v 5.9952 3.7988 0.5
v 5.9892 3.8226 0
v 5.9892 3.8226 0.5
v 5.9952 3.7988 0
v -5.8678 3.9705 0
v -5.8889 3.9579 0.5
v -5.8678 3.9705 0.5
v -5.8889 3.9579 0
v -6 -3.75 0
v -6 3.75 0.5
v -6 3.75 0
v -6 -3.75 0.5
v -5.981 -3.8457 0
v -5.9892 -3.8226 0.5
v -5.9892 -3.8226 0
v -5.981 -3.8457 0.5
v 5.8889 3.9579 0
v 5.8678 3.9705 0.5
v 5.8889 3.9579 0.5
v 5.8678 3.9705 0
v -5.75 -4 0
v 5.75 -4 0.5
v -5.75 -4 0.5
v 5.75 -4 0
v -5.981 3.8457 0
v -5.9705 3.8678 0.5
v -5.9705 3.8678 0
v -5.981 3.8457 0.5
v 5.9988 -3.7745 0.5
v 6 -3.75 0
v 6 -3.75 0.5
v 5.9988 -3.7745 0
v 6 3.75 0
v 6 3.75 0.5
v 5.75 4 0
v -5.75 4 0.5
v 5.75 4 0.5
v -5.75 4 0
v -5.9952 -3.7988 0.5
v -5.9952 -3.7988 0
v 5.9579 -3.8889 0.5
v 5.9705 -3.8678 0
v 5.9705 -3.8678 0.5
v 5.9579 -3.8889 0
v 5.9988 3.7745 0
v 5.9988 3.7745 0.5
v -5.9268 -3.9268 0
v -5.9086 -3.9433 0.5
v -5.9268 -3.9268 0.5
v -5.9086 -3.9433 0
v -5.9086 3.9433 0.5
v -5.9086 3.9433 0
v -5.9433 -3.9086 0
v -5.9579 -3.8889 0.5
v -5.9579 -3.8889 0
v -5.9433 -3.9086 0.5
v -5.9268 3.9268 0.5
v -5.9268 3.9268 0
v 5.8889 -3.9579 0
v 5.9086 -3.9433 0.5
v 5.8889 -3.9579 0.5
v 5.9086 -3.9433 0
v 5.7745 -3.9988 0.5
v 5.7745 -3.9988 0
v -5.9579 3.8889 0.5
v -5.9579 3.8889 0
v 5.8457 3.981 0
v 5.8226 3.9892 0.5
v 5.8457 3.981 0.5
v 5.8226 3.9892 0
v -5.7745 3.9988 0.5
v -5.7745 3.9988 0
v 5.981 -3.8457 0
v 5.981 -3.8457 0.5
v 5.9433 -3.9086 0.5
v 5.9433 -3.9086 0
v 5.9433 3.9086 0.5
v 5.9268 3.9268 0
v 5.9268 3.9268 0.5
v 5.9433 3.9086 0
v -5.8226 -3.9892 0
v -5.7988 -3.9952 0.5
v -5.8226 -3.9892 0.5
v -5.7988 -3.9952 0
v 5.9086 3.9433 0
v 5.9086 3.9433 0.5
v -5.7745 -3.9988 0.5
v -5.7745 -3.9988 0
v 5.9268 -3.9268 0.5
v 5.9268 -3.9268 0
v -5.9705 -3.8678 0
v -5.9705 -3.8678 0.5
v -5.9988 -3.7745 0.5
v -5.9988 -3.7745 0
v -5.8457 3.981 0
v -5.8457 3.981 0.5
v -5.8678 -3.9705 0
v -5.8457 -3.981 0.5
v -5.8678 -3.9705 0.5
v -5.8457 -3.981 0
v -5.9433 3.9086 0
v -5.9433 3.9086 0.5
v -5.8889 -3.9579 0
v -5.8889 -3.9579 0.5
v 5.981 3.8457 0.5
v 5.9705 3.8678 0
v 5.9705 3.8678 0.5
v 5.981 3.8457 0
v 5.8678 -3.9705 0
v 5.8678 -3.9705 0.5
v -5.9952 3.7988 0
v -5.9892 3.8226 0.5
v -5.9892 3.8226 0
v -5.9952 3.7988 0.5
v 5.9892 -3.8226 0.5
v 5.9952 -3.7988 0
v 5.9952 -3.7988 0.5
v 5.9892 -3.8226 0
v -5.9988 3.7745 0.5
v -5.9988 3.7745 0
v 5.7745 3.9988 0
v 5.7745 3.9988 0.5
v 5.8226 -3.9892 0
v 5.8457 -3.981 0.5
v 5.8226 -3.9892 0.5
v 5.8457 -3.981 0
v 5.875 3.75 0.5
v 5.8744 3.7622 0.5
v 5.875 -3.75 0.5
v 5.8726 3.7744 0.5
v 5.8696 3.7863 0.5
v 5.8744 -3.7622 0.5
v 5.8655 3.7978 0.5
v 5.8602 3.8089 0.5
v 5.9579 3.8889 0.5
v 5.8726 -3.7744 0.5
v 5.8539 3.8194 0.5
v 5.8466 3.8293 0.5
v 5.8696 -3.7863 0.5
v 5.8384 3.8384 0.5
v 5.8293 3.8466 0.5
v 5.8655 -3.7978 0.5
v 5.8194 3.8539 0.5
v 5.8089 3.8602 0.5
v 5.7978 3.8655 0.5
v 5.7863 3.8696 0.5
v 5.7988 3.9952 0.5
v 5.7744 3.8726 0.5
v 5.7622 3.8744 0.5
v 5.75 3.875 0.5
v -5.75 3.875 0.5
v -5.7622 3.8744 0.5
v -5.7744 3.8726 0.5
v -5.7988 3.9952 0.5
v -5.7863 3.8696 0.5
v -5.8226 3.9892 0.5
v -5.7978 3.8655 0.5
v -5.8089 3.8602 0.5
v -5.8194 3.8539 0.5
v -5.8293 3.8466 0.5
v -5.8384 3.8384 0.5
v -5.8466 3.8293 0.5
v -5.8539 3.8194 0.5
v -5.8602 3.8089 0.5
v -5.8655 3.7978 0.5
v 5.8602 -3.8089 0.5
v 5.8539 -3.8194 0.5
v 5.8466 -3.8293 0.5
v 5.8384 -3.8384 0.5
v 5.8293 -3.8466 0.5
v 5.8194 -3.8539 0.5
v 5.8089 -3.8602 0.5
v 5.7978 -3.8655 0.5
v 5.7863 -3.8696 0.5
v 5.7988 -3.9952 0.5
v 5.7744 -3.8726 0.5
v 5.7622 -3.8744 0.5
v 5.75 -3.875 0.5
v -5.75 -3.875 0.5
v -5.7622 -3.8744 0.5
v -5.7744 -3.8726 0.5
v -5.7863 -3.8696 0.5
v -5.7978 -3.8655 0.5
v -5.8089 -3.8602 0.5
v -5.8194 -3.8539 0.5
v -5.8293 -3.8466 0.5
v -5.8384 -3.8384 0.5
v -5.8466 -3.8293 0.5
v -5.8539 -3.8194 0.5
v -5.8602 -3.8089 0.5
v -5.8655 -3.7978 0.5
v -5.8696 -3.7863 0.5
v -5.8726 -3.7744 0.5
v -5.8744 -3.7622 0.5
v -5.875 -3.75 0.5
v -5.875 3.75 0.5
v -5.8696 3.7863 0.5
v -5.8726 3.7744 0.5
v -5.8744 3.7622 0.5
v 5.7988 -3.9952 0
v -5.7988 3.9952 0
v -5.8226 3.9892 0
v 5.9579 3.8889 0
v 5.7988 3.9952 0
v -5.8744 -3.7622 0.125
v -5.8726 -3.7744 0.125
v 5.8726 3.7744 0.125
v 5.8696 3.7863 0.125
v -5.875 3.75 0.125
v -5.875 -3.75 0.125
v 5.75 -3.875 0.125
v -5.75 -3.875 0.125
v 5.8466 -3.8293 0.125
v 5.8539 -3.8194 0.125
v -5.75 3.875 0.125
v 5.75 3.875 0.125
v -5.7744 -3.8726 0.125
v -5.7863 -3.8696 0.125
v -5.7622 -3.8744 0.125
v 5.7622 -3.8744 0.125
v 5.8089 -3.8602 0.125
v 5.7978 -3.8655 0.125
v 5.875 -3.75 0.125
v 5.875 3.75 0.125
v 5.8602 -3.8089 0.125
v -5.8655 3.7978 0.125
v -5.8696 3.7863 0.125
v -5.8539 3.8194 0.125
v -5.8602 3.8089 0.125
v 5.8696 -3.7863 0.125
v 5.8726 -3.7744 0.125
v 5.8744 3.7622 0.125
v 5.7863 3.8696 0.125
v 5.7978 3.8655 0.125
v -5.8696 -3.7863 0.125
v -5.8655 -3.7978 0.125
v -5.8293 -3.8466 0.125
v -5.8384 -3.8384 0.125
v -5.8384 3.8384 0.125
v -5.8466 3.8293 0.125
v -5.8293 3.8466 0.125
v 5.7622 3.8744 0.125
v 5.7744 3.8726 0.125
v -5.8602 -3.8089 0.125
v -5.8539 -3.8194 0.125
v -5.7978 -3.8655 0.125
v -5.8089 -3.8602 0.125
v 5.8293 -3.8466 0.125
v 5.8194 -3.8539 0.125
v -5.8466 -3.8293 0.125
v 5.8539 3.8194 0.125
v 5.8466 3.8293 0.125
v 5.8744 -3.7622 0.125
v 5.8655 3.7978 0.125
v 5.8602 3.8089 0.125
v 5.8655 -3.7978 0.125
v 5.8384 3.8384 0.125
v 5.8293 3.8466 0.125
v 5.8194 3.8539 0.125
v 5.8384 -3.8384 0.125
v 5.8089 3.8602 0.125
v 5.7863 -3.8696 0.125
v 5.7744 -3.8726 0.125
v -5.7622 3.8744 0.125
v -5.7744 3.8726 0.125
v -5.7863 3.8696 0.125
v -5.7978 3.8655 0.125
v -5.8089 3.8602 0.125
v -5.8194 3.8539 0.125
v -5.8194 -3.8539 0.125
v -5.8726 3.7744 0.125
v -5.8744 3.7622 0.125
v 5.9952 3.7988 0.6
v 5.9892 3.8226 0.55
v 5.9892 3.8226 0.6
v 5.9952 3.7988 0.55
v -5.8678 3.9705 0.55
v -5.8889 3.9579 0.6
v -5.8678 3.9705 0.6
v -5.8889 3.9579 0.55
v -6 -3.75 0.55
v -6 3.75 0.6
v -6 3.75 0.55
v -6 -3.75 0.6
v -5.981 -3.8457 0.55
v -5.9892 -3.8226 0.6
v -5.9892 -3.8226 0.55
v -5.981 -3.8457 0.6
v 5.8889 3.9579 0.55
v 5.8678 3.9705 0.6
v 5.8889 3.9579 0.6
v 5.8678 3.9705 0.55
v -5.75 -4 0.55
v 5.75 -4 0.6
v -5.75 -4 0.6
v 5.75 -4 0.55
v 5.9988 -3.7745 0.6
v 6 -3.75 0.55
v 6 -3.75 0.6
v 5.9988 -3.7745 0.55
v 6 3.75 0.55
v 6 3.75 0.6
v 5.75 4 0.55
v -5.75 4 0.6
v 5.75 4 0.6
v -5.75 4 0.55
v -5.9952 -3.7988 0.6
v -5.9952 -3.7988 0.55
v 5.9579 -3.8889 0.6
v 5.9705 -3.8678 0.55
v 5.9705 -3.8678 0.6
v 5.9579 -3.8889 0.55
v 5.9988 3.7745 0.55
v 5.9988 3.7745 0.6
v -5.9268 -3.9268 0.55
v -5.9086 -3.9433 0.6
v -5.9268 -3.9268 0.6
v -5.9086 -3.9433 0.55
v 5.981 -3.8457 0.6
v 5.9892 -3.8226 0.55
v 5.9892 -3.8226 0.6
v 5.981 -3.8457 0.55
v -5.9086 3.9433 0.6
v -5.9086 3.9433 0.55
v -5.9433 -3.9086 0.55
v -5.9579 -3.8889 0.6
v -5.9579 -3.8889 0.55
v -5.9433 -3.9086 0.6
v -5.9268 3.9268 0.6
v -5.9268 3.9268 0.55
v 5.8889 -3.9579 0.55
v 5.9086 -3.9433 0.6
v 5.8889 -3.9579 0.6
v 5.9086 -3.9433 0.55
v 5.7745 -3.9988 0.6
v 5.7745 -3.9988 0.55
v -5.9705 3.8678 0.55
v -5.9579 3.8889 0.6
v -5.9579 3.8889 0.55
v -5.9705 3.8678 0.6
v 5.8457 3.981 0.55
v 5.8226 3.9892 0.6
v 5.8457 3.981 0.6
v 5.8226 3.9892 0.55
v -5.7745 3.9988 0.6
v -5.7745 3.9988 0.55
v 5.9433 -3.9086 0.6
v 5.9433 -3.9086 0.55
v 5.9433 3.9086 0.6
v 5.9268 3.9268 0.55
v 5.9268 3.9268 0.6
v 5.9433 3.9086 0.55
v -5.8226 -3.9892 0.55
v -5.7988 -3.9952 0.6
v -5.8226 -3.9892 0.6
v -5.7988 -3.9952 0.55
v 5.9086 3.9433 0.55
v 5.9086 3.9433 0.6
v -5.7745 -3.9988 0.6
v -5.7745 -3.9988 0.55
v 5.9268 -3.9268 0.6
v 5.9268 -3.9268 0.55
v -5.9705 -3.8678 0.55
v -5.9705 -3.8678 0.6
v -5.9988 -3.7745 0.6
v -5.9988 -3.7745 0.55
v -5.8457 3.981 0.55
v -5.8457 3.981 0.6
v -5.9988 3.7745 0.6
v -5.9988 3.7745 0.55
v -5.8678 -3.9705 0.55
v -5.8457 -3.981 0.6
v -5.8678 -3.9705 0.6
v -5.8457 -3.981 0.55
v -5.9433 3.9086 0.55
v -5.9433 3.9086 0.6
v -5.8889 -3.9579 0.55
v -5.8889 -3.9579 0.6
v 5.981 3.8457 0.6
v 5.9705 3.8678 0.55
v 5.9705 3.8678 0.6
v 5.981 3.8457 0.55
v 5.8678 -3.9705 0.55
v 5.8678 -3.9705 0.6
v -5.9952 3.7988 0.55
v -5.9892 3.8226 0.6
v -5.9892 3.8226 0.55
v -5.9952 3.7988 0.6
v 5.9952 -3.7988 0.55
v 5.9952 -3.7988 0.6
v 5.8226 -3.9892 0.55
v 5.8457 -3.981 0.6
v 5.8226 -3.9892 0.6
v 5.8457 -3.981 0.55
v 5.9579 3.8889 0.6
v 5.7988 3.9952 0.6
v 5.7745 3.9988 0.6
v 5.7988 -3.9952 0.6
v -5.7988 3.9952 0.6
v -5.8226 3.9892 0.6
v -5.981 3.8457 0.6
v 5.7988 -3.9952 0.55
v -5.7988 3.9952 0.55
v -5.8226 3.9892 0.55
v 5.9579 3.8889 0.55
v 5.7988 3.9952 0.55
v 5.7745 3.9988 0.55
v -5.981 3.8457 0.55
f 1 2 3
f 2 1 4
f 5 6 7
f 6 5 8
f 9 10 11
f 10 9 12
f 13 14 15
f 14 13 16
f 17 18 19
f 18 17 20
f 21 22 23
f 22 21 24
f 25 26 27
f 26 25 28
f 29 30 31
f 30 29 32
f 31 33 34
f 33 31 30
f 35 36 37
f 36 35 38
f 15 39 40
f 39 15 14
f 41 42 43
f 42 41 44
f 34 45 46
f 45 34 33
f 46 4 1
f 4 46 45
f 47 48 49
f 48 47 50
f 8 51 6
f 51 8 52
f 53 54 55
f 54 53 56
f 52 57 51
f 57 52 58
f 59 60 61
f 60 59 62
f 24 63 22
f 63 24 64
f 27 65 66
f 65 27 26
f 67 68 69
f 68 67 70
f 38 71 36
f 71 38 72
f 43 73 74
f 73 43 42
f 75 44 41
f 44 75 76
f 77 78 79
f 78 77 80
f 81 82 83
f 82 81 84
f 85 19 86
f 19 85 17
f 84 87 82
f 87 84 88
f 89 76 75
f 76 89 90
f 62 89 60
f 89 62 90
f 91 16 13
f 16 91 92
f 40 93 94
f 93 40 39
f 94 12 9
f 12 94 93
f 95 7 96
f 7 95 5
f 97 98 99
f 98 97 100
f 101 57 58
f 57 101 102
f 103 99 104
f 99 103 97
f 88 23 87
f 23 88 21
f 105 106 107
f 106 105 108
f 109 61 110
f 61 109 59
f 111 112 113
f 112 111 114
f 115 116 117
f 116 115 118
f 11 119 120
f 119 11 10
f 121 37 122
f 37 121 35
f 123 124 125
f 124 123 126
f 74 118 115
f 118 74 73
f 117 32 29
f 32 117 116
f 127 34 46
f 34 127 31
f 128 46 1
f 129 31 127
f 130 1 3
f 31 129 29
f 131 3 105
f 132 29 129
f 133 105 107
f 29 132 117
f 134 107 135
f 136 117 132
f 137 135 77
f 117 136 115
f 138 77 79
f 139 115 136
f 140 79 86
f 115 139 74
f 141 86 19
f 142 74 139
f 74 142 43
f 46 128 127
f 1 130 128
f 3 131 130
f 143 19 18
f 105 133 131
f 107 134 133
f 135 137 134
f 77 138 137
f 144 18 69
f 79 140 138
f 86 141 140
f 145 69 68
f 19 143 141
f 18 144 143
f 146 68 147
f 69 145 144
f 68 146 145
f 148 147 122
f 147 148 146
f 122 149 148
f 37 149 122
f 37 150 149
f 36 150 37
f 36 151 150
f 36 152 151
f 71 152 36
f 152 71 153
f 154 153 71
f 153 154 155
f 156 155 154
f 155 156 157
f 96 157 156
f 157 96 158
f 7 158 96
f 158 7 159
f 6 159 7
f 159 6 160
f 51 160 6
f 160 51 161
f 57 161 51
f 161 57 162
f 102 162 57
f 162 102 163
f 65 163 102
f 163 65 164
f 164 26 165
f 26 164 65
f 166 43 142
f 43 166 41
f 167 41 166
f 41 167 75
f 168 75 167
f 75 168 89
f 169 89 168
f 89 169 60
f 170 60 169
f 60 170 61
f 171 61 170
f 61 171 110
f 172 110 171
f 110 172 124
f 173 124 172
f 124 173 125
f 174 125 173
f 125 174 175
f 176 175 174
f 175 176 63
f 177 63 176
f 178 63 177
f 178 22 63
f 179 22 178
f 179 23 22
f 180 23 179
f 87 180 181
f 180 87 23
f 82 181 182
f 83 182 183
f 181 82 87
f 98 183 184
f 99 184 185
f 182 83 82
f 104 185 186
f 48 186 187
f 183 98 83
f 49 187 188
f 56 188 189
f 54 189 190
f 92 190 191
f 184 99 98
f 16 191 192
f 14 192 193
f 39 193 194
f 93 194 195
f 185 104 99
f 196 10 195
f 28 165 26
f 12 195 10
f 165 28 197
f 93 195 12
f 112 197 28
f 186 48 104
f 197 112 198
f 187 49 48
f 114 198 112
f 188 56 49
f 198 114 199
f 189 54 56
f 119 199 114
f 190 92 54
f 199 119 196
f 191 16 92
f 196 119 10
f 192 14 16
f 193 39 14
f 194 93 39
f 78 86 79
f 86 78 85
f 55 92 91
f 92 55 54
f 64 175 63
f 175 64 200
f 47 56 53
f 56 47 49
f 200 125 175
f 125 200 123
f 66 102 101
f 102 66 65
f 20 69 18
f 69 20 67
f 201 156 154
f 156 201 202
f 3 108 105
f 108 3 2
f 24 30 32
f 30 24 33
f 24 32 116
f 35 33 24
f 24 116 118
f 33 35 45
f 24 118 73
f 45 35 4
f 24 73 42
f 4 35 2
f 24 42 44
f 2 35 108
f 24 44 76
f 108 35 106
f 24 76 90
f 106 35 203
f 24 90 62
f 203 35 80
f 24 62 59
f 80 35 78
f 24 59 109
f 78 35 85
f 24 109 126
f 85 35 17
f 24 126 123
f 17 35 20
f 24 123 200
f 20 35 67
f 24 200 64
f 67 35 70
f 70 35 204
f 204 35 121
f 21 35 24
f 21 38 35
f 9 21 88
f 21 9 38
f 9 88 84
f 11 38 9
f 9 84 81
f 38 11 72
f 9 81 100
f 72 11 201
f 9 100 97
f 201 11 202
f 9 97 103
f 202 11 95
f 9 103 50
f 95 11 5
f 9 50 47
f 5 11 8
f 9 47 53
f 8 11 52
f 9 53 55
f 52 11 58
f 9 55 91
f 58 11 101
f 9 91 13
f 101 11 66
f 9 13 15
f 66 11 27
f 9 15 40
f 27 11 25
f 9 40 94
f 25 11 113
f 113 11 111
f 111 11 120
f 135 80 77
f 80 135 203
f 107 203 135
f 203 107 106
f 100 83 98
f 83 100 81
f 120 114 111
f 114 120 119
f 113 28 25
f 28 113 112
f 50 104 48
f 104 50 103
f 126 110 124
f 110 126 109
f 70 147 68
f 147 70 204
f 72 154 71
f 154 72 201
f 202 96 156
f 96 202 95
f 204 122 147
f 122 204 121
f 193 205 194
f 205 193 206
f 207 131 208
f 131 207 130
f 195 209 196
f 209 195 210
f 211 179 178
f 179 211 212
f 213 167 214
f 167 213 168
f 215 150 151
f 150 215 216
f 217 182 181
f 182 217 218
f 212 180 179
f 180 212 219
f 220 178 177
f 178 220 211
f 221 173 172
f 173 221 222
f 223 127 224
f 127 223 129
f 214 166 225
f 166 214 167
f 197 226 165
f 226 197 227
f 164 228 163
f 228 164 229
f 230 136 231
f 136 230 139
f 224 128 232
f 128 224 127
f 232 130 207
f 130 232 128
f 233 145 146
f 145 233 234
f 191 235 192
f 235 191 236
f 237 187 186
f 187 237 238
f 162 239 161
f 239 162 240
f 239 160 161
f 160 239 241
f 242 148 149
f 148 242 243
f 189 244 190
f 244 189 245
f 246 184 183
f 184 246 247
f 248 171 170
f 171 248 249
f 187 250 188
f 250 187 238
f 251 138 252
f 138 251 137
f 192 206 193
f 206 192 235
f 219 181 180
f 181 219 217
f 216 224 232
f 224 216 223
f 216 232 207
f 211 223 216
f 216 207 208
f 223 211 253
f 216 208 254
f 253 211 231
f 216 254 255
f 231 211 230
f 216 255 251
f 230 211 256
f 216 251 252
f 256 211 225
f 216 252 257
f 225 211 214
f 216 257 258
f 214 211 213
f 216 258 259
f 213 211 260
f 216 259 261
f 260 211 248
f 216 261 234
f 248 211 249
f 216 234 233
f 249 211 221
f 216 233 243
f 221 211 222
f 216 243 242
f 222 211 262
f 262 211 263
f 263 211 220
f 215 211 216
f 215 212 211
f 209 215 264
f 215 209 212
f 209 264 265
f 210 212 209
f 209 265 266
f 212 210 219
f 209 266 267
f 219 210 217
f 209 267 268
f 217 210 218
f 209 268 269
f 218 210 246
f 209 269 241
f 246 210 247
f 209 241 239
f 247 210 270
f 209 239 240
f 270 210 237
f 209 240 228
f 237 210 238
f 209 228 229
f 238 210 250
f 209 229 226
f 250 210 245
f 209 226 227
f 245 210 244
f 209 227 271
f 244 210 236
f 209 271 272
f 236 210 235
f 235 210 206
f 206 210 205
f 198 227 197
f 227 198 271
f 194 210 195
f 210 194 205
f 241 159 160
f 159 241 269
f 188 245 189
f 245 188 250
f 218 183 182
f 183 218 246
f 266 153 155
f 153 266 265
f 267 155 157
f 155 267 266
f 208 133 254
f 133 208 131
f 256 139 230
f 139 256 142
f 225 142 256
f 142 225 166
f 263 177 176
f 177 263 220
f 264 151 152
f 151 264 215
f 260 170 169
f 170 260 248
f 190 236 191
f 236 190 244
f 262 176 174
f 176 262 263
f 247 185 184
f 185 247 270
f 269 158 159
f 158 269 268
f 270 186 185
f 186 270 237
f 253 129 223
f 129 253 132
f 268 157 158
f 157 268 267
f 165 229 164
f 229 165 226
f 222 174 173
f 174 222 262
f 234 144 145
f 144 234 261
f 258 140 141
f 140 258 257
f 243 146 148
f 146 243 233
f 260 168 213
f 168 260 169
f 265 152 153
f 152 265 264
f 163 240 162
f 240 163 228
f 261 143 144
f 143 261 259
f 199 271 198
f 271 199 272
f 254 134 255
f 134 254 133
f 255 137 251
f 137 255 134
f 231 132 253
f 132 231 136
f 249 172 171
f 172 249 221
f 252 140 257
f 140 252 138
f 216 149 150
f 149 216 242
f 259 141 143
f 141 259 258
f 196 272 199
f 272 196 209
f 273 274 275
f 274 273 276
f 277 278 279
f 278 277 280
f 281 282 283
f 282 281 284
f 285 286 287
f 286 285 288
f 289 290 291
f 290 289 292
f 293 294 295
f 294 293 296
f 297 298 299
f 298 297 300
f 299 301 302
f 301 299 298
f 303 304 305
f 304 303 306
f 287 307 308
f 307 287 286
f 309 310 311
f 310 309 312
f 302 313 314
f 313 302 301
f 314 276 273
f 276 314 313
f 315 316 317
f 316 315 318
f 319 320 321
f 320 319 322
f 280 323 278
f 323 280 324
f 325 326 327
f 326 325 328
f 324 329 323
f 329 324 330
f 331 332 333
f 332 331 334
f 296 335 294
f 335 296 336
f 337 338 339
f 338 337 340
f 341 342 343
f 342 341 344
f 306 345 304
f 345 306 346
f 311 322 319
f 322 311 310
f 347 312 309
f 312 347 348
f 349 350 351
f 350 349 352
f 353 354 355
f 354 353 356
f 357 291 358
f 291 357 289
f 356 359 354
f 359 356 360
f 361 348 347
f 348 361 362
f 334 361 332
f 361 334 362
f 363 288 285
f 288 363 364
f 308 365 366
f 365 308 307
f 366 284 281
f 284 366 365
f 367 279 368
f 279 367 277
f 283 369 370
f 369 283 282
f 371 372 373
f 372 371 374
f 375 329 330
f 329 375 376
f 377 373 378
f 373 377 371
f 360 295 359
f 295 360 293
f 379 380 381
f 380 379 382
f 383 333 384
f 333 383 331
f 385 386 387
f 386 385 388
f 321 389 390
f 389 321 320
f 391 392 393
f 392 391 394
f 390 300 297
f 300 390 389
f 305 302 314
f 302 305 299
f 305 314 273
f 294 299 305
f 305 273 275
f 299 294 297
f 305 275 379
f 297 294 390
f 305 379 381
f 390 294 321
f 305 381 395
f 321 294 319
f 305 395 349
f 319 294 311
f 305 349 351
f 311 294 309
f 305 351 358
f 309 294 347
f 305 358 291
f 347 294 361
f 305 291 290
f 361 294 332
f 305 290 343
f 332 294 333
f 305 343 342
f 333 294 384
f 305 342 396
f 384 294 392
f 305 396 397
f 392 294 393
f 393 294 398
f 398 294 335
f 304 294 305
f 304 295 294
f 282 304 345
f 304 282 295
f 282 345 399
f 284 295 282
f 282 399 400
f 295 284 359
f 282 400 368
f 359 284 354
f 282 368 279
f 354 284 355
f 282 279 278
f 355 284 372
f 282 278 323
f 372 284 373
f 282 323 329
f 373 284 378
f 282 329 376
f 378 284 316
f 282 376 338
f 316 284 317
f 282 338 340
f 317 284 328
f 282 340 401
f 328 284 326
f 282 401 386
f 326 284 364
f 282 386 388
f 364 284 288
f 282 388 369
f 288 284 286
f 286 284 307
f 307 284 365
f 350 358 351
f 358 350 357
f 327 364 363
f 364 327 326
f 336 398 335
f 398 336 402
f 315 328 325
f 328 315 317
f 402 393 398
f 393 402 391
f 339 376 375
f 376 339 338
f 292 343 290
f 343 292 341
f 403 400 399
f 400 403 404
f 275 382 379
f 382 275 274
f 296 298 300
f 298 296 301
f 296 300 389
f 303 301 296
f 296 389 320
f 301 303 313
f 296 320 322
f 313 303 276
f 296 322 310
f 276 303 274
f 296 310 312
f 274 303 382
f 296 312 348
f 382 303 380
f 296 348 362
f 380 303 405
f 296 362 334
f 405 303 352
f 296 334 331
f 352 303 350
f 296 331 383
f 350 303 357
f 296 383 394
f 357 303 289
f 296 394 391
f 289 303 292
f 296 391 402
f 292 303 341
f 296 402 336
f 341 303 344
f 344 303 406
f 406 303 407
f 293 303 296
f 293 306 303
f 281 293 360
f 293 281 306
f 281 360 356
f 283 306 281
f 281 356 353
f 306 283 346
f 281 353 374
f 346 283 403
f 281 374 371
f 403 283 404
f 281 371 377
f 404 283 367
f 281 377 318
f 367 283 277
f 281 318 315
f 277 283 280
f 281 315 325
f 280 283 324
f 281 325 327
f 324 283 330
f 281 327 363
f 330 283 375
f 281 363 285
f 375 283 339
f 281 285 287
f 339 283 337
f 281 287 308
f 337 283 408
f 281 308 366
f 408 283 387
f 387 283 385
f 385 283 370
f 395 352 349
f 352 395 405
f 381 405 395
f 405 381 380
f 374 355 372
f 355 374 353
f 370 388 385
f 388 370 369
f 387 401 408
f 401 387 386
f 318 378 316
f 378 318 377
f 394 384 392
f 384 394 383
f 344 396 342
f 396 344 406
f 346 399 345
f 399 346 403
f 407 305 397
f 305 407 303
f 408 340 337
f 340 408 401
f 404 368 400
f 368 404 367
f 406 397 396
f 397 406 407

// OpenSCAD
// Parametric box for CNC (units: inches)
// Usage: change width, height, depth, wall_thickness and render/export as STL or 2D projection.

width = 12; // inches
height = 8; // inches
depth = 0.5; // thickness in inches
wall_thickness = 0.125; // 1/8"
corner_radius = 0.25; // inches
show_lid = true;
lid_overlap = 0.05; // overlap in inches

module rounded_rect(w, h, r) {
  if (r <= 0) {
    square([w, h], center=true);
  } else {
    minkowski() {
      square([w-2*r, h-2*r], center=true);
      circle(r=r, $fn=64);
    }
  }
}

difference() {
  // outer box
  translate([0,0,0]) linear_extrude(depth)
    rounded_rect(width, height, corner_radius);
  // inner cutout
  translate([0,0,wall_thickness]) linear_extrude(depth - wall_thickness)
    rounded_rect(width - 2*wall_thickness, height - 2*wall_thickness, max(0, corner_radius - wall_thickness));
}

if (show_lid) {
  translate([0, 0, depth + 0.05]) // offset for the lid preview
    color([0.8,0.6,0.6,0.6]) translate([0,0,0])
      linear_extrude(lid_overlap)
        rounded_rect(width, height, corner_radius);
}
